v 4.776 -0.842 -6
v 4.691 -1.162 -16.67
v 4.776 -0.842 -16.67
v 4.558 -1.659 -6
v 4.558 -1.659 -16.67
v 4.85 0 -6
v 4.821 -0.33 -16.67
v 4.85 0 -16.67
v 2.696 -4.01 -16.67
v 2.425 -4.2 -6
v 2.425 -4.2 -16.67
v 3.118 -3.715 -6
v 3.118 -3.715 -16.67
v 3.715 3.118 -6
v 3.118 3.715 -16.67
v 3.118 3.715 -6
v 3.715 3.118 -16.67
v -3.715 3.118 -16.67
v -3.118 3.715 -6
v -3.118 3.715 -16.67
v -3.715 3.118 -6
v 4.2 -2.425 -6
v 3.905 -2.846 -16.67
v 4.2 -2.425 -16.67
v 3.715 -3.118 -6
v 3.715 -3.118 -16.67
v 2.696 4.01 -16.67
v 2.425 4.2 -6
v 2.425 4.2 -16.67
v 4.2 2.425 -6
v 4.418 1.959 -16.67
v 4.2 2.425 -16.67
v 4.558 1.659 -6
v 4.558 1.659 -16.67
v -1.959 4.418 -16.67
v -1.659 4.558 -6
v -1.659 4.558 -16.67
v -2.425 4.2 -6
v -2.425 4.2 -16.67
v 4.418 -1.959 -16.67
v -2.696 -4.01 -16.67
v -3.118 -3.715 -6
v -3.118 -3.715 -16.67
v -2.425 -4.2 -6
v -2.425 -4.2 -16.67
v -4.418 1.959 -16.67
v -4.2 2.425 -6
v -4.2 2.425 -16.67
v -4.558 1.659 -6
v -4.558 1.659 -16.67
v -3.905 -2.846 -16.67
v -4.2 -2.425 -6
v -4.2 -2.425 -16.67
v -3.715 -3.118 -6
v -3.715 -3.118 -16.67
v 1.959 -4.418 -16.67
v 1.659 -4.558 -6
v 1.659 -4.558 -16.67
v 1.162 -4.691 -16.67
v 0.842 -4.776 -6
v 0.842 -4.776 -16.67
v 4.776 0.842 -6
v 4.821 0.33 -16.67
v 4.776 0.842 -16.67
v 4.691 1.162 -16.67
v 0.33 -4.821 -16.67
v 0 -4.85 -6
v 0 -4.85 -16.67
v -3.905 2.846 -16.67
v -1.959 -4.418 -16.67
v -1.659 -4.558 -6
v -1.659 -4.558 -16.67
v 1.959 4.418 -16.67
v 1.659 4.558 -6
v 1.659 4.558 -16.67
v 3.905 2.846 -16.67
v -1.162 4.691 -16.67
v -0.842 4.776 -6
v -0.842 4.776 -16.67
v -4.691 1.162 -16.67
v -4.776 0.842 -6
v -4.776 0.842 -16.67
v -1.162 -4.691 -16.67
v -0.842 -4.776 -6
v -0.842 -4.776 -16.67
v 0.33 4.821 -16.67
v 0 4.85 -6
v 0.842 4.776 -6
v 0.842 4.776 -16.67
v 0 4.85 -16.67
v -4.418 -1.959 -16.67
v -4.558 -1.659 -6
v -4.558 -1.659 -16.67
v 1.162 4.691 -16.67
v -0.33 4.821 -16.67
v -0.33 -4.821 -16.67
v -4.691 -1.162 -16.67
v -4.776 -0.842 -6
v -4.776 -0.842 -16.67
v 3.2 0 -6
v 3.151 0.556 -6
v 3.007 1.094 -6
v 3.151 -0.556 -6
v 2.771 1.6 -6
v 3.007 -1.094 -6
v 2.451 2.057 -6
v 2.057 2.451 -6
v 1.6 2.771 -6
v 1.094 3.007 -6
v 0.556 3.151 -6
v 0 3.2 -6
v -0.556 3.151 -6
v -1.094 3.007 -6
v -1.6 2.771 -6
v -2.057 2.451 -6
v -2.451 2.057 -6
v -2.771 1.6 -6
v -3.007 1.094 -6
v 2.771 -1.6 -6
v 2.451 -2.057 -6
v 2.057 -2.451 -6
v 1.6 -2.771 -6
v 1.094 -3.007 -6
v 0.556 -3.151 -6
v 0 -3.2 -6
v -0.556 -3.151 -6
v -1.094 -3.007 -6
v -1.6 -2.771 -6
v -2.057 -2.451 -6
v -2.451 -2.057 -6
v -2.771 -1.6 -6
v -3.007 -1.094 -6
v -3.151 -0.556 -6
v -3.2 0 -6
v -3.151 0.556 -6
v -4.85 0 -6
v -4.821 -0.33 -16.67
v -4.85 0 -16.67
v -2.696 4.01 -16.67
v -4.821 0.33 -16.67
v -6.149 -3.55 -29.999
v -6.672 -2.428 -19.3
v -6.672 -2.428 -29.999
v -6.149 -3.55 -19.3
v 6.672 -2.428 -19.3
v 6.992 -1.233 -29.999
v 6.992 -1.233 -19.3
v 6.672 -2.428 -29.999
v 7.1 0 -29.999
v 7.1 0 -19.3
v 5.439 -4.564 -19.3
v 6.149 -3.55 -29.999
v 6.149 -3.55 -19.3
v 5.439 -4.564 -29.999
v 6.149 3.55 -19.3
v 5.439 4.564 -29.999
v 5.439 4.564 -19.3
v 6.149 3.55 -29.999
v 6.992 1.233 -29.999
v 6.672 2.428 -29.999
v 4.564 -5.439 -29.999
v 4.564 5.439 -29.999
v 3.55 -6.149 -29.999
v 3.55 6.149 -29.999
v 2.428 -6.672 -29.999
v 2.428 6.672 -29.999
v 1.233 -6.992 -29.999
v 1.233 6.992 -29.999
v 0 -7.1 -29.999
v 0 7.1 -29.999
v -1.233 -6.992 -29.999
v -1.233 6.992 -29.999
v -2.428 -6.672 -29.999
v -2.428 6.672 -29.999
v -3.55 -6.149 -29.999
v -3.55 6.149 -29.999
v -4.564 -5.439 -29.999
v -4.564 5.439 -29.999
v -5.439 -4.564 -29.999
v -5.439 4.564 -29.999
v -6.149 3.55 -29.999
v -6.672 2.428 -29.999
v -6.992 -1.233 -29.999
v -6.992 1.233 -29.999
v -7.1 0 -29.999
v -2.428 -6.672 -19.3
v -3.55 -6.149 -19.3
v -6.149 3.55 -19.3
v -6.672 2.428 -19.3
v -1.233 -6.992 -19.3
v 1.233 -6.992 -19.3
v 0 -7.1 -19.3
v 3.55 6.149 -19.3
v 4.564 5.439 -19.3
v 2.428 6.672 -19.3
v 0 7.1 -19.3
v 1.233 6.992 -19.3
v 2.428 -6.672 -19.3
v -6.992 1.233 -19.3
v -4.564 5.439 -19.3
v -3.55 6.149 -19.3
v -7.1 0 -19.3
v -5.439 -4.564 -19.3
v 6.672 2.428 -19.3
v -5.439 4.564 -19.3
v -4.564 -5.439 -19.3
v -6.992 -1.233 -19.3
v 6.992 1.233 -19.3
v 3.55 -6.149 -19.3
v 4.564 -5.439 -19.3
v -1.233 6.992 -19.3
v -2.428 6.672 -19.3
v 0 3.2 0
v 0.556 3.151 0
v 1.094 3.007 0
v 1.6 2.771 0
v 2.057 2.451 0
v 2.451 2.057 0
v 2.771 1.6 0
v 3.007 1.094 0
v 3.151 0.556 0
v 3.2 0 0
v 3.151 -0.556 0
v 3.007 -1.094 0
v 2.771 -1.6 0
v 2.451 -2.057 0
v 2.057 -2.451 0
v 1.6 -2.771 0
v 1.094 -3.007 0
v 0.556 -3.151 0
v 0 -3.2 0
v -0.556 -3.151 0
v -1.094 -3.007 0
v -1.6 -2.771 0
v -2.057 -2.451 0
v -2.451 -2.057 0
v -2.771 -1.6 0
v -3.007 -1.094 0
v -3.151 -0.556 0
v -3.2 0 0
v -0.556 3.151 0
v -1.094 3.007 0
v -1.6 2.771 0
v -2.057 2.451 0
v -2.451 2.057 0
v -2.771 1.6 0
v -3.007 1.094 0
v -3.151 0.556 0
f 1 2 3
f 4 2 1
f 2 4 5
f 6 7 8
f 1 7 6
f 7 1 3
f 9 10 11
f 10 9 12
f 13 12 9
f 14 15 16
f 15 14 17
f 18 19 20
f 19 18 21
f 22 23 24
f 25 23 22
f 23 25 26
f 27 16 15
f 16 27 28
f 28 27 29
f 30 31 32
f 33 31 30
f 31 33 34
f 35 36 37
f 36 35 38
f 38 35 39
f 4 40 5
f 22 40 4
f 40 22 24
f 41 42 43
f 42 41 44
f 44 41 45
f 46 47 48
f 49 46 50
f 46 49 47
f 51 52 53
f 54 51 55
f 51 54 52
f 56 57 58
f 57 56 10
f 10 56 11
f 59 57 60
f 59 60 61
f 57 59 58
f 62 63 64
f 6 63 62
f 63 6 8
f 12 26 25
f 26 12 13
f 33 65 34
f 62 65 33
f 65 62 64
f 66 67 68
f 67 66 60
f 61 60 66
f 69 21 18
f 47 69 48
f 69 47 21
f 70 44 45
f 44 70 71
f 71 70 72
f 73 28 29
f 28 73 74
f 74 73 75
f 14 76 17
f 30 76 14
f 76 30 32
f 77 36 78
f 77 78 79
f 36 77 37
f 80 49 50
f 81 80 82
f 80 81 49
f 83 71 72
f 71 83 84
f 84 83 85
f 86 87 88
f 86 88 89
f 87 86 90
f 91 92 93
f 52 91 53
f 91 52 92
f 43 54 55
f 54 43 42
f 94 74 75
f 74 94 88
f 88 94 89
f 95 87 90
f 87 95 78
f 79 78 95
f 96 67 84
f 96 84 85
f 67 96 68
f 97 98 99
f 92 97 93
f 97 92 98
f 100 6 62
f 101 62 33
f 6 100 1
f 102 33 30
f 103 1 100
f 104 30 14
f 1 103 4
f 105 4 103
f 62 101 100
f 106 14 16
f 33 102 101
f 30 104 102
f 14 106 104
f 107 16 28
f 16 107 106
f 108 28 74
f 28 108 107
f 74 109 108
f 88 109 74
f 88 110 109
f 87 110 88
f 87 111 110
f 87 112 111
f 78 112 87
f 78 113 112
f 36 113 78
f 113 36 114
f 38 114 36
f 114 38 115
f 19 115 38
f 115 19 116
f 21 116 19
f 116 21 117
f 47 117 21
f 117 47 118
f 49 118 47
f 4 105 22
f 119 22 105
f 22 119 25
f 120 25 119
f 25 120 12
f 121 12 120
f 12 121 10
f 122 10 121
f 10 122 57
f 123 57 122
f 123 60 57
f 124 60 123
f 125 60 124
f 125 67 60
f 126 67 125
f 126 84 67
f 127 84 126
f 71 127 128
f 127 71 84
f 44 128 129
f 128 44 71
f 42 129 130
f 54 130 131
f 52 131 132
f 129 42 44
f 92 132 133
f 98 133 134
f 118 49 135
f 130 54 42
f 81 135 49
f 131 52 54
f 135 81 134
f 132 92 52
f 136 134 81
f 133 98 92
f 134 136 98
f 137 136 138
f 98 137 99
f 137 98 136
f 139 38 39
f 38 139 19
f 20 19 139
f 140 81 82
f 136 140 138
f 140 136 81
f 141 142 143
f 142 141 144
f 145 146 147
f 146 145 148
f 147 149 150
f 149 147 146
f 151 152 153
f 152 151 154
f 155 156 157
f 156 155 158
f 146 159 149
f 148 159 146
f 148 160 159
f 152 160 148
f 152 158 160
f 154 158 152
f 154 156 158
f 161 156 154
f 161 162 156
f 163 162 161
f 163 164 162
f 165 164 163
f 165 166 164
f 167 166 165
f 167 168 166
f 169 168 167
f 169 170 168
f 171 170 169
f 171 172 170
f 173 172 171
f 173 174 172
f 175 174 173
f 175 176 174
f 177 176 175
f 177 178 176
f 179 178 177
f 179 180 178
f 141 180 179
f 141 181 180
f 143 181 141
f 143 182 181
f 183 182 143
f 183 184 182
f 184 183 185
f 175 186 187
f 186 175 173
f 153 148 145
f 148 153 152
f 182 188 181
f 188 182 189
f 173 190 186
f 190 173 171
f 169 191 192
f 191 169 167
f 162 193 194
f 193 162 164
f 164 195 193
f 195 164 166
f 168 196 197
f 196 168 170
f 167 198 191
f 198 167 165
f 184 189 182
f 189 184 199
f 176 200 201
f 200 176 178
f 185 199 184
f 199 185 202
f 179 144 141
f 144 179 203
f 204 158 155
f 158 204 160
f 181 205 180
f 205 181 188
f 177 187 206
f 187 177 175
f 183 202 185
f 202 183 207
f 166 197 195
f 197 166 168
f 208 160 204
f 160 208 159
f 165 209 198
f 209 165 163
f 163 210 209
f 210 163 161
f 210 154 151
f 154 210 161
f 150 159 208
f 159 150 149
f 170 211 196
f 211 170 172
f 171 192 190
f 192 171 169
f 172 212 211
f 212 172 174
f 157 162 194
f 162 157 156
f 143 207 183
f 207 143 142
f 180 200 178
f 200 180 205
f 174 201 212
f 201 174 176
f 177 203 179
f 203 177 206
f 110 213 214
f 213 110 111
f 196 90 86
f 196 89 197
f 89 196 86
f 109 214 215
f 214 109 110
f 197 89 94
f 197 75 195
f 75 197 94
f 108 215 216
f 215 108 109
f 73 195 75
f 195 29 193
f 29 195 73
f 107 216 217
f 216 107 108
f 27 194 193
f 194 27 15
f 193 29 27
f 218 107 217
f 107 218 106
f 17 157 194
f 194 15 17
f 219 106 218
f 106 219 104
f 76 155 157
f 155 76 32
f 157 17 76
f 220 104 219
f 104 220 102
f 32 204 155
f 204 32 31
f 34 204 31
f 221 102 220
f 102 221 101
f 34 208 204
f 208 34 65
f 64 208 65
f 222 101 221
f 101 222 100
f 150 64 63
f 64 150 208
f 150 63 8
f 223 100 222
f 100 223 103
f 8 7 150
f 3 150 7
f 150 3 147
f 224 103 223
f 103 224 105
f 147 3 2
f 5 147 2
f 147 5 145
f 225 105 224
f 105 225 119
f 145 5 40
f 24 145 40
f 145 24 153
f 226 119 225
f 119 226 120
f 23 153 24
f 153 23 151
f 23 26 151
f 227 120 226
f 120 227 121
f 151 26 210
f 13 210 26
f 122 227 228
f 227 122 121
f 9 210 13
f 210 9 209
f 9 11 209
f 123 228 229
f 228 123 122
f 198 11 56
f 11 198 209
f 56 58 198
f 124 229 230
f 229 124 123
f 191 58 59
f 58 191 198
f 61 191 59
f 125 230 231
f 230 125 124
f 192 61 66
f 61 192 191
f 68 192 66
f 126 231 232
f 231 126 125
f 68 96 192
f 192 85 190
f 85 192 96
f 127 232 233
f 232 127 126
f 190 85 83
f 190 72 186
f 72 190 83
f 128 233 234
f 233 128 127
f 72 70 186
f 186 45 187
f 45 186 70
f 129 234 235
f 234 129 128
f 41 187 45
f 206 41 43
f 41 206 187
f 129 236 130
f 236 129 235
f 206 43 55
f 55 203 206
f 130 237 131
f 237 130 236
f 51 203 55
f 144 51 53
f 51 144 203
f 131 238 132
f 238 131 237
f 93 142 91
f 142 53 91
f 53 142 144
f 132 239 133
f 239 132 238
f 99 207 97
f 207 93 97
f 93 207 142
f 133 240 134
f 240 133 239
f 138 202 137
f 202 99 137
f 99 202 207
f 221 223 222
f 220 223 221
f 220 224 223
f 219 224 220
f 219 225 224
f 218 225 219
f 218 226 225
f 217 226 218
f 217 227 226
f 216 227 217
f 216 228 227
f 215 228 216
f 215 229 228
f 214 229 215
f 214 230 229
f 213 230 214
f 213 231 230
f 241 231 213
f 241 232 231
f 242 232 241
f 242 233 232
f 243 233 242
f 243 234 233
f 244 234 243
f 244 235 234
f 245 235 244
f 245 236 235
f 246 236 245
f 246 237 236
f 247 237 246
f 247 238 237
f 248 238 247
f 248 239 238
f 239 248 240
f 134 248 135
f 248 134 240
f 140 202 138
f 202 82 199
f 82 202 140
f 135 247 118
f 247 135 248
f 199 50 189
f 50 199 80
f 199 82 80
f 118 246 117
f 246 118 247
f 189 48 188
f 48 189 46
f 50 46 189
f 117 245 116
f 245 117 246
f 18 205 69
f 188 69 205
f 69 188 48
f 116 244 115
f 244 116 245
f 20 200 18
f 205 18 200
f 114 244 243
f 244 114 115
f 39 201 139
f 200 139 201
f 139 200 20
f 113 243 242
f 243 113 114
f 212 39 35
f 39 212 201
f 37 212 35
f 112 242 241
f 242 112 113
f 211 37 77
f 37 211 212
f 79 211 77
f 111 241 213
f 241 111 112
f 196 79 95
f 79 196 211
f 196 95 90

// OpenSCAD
// Start: lazy_union
default_5_default_5();
// End: lazy_union

// Modules.

// 'PartMaterial undef-default - default 5.0'
module default_5_default_5() {
  // 'None : _combine_solids_and_holes'
  union() {
    // 'default : _combine_solids_and_holes'
    union() {
      // 'screw_cage'
      %multmatrix(m=[[1.0, 0.0, 0.0, 0.0], [-0.0, -1.0, -0.0, -0.0], [-0.0, -0.0, -1.0, -0.0], [0.0, 0.0, 0.0, 1.0]]) {
        // 'screw_cage'
        color(c=[0.0, 1.0, 0.35, 0.4]) {
          // 'screw_cage : _combine_solids_and_holes'
          union() {
            // 'screw_cage'
            cylinder(h=20.0, r1=3.35, r2=3.35, center=false, $fn=36);
          }
        }
      }
      // 'thru_shaft'
      multmatrix(m=[[1.0, 0.0, 0.0, 0.0], [0.0, -1.0, 0.0, 0.0], [0.0, 0.0, -1.0, -6.0], [0.0, 0.0, 0.0, 1.0]]) {
        // 'thru_shaft : _combine_solids_and_holes'
        union() {
          // 'thru_shaft'
          cylinder(h=14.0, r1=4.85, r2=4.85, center=false, $fn=36);
        }
      }
      // 'access_hole'
      multmatrix(m=[[1.0, 0.0, 0.0, 0.0], [0.0, -1.0, 0.0, 0.0], [0.0, 0.0, -1.0, -19.999], [0.0, 0.0, 0.0, 1.0]]) {
        // 'access_hole : _combine_solids_and_holes'
        union() {
          // 'access_hole'
          cylinder(h=10.0, r1=7.1, r2=7.1, center=false, $fn=36);
        }
      }
      // 'screw_hole'
      multmatrix(m=[[0.0, -1.0, 0.0, 0.0], [-1.0, 0.0, 0.0, 0.0], [0.0, 0.0, -1.0, 0.0], [0.0, 0.0, 0.0, 1.0]]) {
        // 'screw_hole : _combine_solids_and_holes'
        union() {
          // 'screw_hole'
          polyhedron(points=[[0.0, 0.0, 0.0], [-3.2, 0.0, 0.0], [-3.2, 0.0, 6.0], [-3.35, 0.0, 6.0], [-3.35, 0.0, 14.8], [-3.25, 0.0, 14.8], [-7.1, 0.0, 19.3], [-7.1, 0.0, 20.0], [0.0, 0.0, 20.0], [0.0, 0.0, 0.0], [-3.1513848096390658, -0.5556741685341771, 0.0], [-3.1513848096390658, -0.5556741685341771, 6.0], [-3.299105972590897, -0.5817213951842166, 6.0], [-3.299105972590897, -0.5817213951842166, 14.8], [-3.200625197289676, -0.5643565774175235, 14.8], [-6.992135046386677, -1.2329020614352053, 19.3], [-6.992135046386677, -1.2329020614352053, 20.0], [0.0, 0.0, 20.0], [0.0, 0.0, 0.0], [-3.0070163865149073, -1.09446445864214, 0.0], [-3.0070163865149073, -1.09446445864214, 6.0], [-3.1479702796327933, -1.1457674801409903, 6.0], [-3.1479702796327933, -1.1457674801409903, 14.8], [-3.0540010175542025, -1.1115654658084233, 14.8], [-6.67181760757995, -2.4283430176122476, 19.3], [-6.67181760757995, -2.4283430176122476, 20.0], [0.0, 0.0, 20.0], [0.0, 0.0, 0.0], [-2.771281292110204, -1.5999999999999999, 0.0], [-2.771281292110204, -1.5999999999999999, 6.0], [-2.9011851026778697, -1.6749999999999998, 6.0], [-2.9011851026778697, -1.6749999999999998, 14.8], [-2.814582562299426, -1.6249999999999998, 14.8], [-6.148780366869515, -3.5499999999999994, 19.3], [-6.148780366869515, -3.5499999999999994, 20.0], [0.0, 0.0, 20.0], [0.0, 0.0, 0.0], [-2.45134221798073, -2.0569203509969256, 0.0], [-2.45134221798073, -2.0569203509969256, 6.0], [-2.5662488844485765, -2.1533384924499064, 6.0], [-2.5662488844485765, -2.1533384924499064, 14.8], [-2.4896444401366784, -2.0890597314812527, 14.8], [-5.438915546144743, -4.5637920287744285, 19.3], [-5.438915546144743, -4.5637920287744285, 20.0], [0.0, 0.0, 20.0], [0.0, 0.0, 0.0], [-2.056920350996926, -2.45134221798073, 0.0], [-2.056920350996926, -2.45134221798073, 6.0], [-2.153338492449907, -2.5662488844485765, 6.0], [-2.153338492449907, -2.5662488844485765, 14.8], [-2.089059731481253, -2.4896444401366784, 14.8], [-4.563792028774429, -5.438915546144743, 19.3], [-4.563792028774429, -5.438915546144743, 20.0], [0.0, 0.0, 20.0], [0.0, 0.0, 0.0], [-1.6000000000000005, -2.7712812921102037, 0.0], [-1.6000000000000005, -2.7712812921102037, 6.0], [-1.6750000000000005, -2.901185102677869, 6.0], [-1.6750000000000005, -2.901185102677869, 14.8], [-1.6250000000000004, -2.8145825622994254, 14.8], [-3.5500000000000007, -6.148780366869514, 19.3], [-3.5500000000000007, -6.148780366869514, 20.0], [0.0, 0.0, 20.0], [0.0, 0.0, 0.0], [-1.0944644586421404, -3.007016386514907, 0.0], [-1.0944644586421404, -3.007016386514907, 6.0], [-1.1457674801409905, -3.147970279632793, 6.0], [-1.1457674801409905, -3.147970279632793, 14.8], [-1.1115654658084237, -3.054001017554202, 14.8], [-2.4283430176122485, -6.671817607579949, 19.3], [-2.4283430176122485, -6.671817607579949, 20.0], [0.0, 0.0, 20.0], [0.0, 0.0, 0.0], [-0.5556741685341774, -3.1513848096390658, 0.0], [-0.5556741685341774, -3.1513848096390658, 6.0], [-0.581721395184217, -3.299105972590897, 6.0], [-0.581721395184217, -3.299105972590897, 14.8], [-0.5643565774175239, -3.200625197289676, 14.8], [-1.232902061435206, -6.992135046386677, 19.3], [-1.232902061435206, -6.992135046386677, 20.0], [0.0, 0.0, 20.0], [0.0, 0.0, 0.0], [0.0, -3.2, 0.0], [0.0, -3.2, 6.0], [0.0, -3.35, 6.0], [0.0, -3.35, 14.8], [0.0, -3.25, 14.8], [0.0, -7.1, 19.3], [0.0, -7.1, 20.0], [0.0, 0.0, 20.0], [0.0, 0.0, 0.0], [0.555674168534177, -3.1513848096390658, 0.0], [0.555674168534177, -3.1513848096390658, 6.0], [0.5817213951842165, -3.299105972590897, 6.0], [0.5817213951842165, -3.299105972590897, 14.8], [0.5643565774175234, -3.200625197289676, 14.8], [1.232902061435205, -6.992135046386677, 19.3], [1.232902061435205, -6.992135046386677, 20.0], [0.0, 0.0, 20.0], [0.0, 0.0, 0.0], [1.09446445864214, -3.0070163865149073, 0.0], [1.09446445864214, -3.0070163865149073, 6.0], [1.1457674801409903, -3.1479702796327933, 6.0], [1.1457674801409903, -3.1479702796327933, 14.8], [1.1115654658084233, -3.0540010175542025, 14.8], [2.4283430176122476, -6.67181760757995, 19.3], [2.4283430176122476, -6.67181760757995, 20.0], [0.0, 0.0, 20.0], [0.0, 0.0, 0.0], [1.5999999999999994, -2.771281292110204, 0.0], [1.5999999999999994, -2.771281292110204, 6.0], [1.6749999999999994, -2.9011851026778697, 6.0], [1.6749999999999994, -2.9011851026778697, 14.8], [1.6249999999999993, -2.814582562299426, 14.8], [3.549999999999998, -6.148780366869515, 19.3], [3.549999999999998, -6.148780366869515, 20.0], [0.0, 0.0, 20.0], [0.0, 0.0, 0.0], [2.056920350996926, -2.45134221798073, 0.0], [2.056920350996926, -2.45134221798073, 6.0], [2.153338492449907, -2.5662488844485765, 6.0], [2.153338492449907, -2.5662488844485765, 14.8], [2.089059731481253, -2.4896444401366784, 14.8], [4.563792028774429, -5.438915546144743, 19.3], [4.563792028774429, -5.438915546144743, 20.0], [0.0, 0.0, 20.0], [0.0, 0.0, 0.0], [2.4513422179807294, -2.0569203509969265, 0.0], [2.4513422179807294, -2.0569203509969265, 6.0], [2.566248884448576, -2.1533384924499073, 6.0], [2.566248884448576, -2.1533384924499073, 14.8], [2.4896444401366784, -2.089059731481253, 14.8], [5.4389155461447425, -4.56379202877443, 19.3], [5.4389155461447425, -4.56379202877443, 20.0], [0.0, 0.0, 20.0], [0.0, 0.0, 0.0], [2.771281292110204, -1.5999999999999999, 0.0], [2.771281292110204, -1.5999999999999999, 6.0], [2.9011851026778697, -1.6749999999999998, 6.0], [2.9011851026778697, -1.6749999999999998, 14.8], [2.814582562299426, -1.6249999999999998, 14.8], [6.148780366869515, -3.5499999999999994, 19.3], [6.148780366869515, -3.5499999999999994, 20.0], [0.0, 0.0, 20.0], [0.0, 0.0, 0.0], [3.007016386514907, -1.0944644586421404, 0.0], [3.007016386514907, -1.0944644586421404, 6.0], [3.147970279632793, -1.1457674801409907, 6.0], [3.147970279632793, -1.1457674801409907, 14.8], [3.054001017554202, -1.111565465808424, 14.8], [6.671817607579949, -2.428343017612249, 19.3], [6.671817607579949, -2.428343017612249, 20.0], [0.0, 0.0, 20.0], [0.0, 0.0, 0.0], [3.1513848096390658, -0.5556741685341783, 0.0], [3.1513848096390658, -0.5556741685341783, 6.0], [3.299105972590897, -0.5817213951842178, 6.0], [3.299105972590897, -0.5817213951842178, 14.8], [3.200625197289676, -0.5643565774175248, 14.8], [6.992135046386677, -1.2329020614352078, 19.3], [6.992135046386677, -1.2329020614352078, 20.0], [0.0, 0.0, 20.0], [0.0, 0.0, 0.0], [3.2, 0.0, 0.0], [3.2, 0.0, 6.0], [3.35, 0.0, 6.0], [3.35, 0.0, 14.8], [3.25, 0.0, 14.8], [7.1, 0.0, 19.3], [7.1, 0.0, 20.0], [0.0, 0.0, 20.0], [0.0, 0.0, 0.0], [3.151384809639066, 0.5556741685341761, 0.0], [3.151384809639066, 0.5556741685341761, 6.0], [3.299105972590897, 0.5817213951842156, 6.0], [3.299105972590897, 0.5817213951842156, 14.8], [3.2006251972896766, 0.5643565774175225, 14.8], [6.992135046386678, 1.232902061435203, 19.3], [6.992135046386678, 1.232902061435203, 20.0], [0.0, 0.0, 20.0], [0.0, 0.0, 0.0], [3.0070163865149073, 1.0944644586421397, 0.0], [3.0070163865149073, 1.0944644586421397, 6.0], [3.1479702796327933, 1.14576748014099, 6.0], [3.1479702796327933, 1.14576748014099, 14.8], [3.0540010175542025, 1.111565465808423, 14.8], [6.67181760757995, 2.428343017612247, 19.3], [6.67181760757995, 2.428343017612247, 20.0], [0.0, 0.0, 20.0], [0.0, 0.0, 0.0], [2.7712812921102046, 1.5999999999999992, 0.0], [2.7712812921102046, 1.5999999999999992, 6.0], [2.90118510267787, 1.6749999999999992, 6.0], [2.90118510267787, 1.6749999999999992, 14.8], [2.8145825622994263, 1.6249999999999991, 14.8], [6.148780366869516, 3.549999999999998, 19.3], [6.148780366869516, 3.549999999999998, 20.0], [0.0, 0.0, 20.0], [0.0, 0.0, 0.0], [2.45134221798073, 2.0569203509969256, 0.0], [2.45134221798073, 2.0569203509969256, 6.0], [2.5662488844485765, 2.1533384924499064, 6.0], [2.5662488844485765, 2.1533384924499064, 14.8], [2.4896444401366784, 2.0890597314812527, 14.8], [5.438915546144743, 4.5637920287744285, 19.3], [5.438915546144743, 4.5637920287744285, 20.0], [0.0, 0.0, 20.0], [0.0, 0.0, 0.0], [2.0569203509969265, 2.4513422179807294, 0.0], [2.0569203509969265, 2.4513422179807294, 6.0], [2.1533384924499073, 2.566248884448576, 6.0], [2.1533384924499073, 2.566248884448576, 14.8], [2.089059731481253, 2.4896444401366784, 14.8], [4.56379202877443, 5.4389155461447425, 19.3], [4.56379202877443, 5.4389155461447425, 20.0], [0.0, 0.0, 20.0], [0.0, 0.0, 0.0], [1.6000000000000014, 2.7712812921102032, 0.0], [1.6000000000000014, 2.7712812921102032, 6.0], [1.6750000000000016, 2.901185102677869, 6.0], [1.6750000000000016, 2.901185102677869, 14.8], [1.6250000000000013, 2.814582562299425, 14.8], [3.550000000000003, 6.148780366869513, 19.3], [3.550000000000003, 6.148780366869513, 20.0], [0.0, 0.0, 20.0], [0.0, 0.0, 0.0], [1.0944644586421421, 3.0070163865149064, 0.0], [1.0944644586421421, 3.0070163865149064, 6.0], [1.1457674801409925, 3.1479702796327924, 6.0], [1.1457674801409925, 3.1479702796327924, 14.8], [1.1115654658084255, 3.0540010175542016, 14.8], [2.4283430176122525, 6.671817607579948, 19.3], [2.4283430176122525, 6.671817607579948, 20.0], [0.0, 0.0, 20.0], [0.0, 0.0, 0.0], [0.5556741685341771, 3.1513848096390658, 0.0], [0.5556741685341771, 3.1513848096390658, 6.0], [0.5817213951842166, 3.299105972590897, 6.0], [0.5817213951842166, 3.299105972590897, 14.8], [0.5643565774175235, 3.200625197289676, 14.8], [1.2329020614352053, 6.992135046386677, 19.3], [1.2329020614352053, 6.992135046386677, 20.0], [0.0, 0.0, 20.0], [0.0, 0.0, 0.0], [0.0, 3.2, 0.0], [0.0, 3.2, 6.0], [0.0, 3.35, 6.0], [0.0, 3.35, 14.8], [0.0, 3.25, 14.8], [0.0, 7.1, 19.3], [0.0, 7.1, 20.0], [0.0, 0.0, 20.0], [0.0, 0.0, 0.0], [-0.555674168534176, 3.151384809639066, 0.0], [-0.555674168534176, 3.151384809639066, 6.0], [-0.5817213951842154, 3.299105972590897, 6.0], [-0.5817213951842154, 3.299105972590897, 14.8], [-0.5643565774175224, 3.2006251972896766, 14.8], [-1.2329020614352026, 6.992135046386678, 19.3], [-1.2329020614352026, 6.992135046386678, 20.0], [0.0, 0.0, 20.0], [0.0, 0.0, 0.0], [-1.0944644586421381, 3.0070163865149073, 0.0], [-1.0944644586421381, 3.0070163865149073, 6.0], [-1.1457674801409883, 3.1479702796327937, 6.0], [-1.1457674801409883, 3.1479702796327937, 14.8], [-1.1115654658084215, 3.054001017554203, 14.8], [-2.4283430176122436, 6.671817607579951, 19.3], [-2.4283430176122436, 6.671817607579951, 20.0], [0.0, 0.0, 20.0], [0.0, 0.0, 0.0], [-1.6000000000000005, 2.7712812921102037, 0.0], [-1.6000000000000005, 2.7712812921102037, 6.0], [-1.6750000000000005, 2.901185102677869, 6.0], [-1.6750000000000005, 2.901185102677869, 14.8], [-1.6250000000000004, 2.8145825622994254, 14.8], [-3.5500000000000007, 6.148780366869514, 19.3], [-3.5500000000000007, 6.148780366869514, 20.0], [0.0, 0.0, 20.0], [0.0, 0.0, 0.0], [-2.0569203509969256, 2.4513422179807303, 0.0], [-2.0569203509969256, 2.4513422179807303, 6.0], [-2.1533384924499064, 2.566248884448577, 6.0], [-2.1533384924499064, 2.566248884448577, 14.8], [-2.0890597314812527, 2.489644440136679, 14.8], [-4.5637920287744285, 5.438915546144744, 19.3], [-4.5637920287744285, 5.438915546144744, 20.0], [0.0, 0.0, 20.0], [0.0, 0.0, 0.0], [-2.451342217980729, 2.056920350996927, 0.0], [-2.451342217980729, 2.056920350996927, 6.0], [-2.5662488844485756, 2.1533384924499077, 6.0], [-2.5662488844485756, 2.1533384924499077, 14.8], [-2.489644440136678, 2.0890597314812536, 14.8], [-5.4389155461447425, 4.563792028774431, 19.3], [-5.4389155461447425, 4.563792028774431, 20.0], [0.0, 0.0, 20.0], [0.0, 0.0, 0.0], [-2.771281292110203, 1.6000000000000014, 0.0], [-2.771281292110203, 1.6000000000000014, 6.0], [-2.9011851026778688, 1.6750000000000016, 6.0], [-2.9011851026778688, 1.6750000000000016, 14.8], [-2.8145825622994245, 1.6250000000000013, 14.8], [-6.148780366869512, 3.550000000000003, 19.3], [-6.148780366869512, 3.550000000000003, 20.0], [0.0, 0.0, 20.0], [0.0, 0.0, 0.0], [-3.007016386514906, 1.0944644586421421, 0.0], [-3.007016386514906, 1.0944644586421421, 6.0], [-3.1479702796327924, 1.1457674801409927, 6.0], [-3.1479702796327924, 1.1457674801409927, 14.8], [-3.054001017554201, 1.1115654658084257, 14.8], [-6.671817607579947, 2.428343017612253, 19.3], [-6.671817607579947, 2.428343017612253, 20.0], [0.0, 0.0, 20.0], [0.0, 0.0, 0.0], [-3.1513848096390658, 0.5556741685341773, 0.0], [-3.1513848096390658, 0.5556741685341773, 6.0], [-3.299105972590897, 0.5817213951842168, 6.0], [-3.299105972590897, 0.5817213951842168, 14.8], [-3.200625197289676, 0.5643565774175238, 14.8], [-6.992135046386677, 1.2329020614352058, 19.3], [-6.992135046386677, 1.2329020614352058, 20.0], [0.0, 0.0, 20.0], [0.0, 0.0, 0.0], [-3.2, 0.0, 0.0], [-3.2, 0.0, 6.0], [-3.35, 0.0, 6.0], [-3.35, 0.0, 14.8], [-3.25, 0.0, 14.8], [-7.1, 0.0, 19.3], [-7.1, 0.0, 20.0], [0.0, 0.0, 20.0]], faces=[[0, 9, 10, 1], [1, 10, 11, 2], [2, 11, 12, 3], [3, 12, 13, 4], [4, 13, 14, 5], [5, 14, 15, 6], [6, 15, 16, 7], [7, 16, 17, 8], [8, 17, 9, 0], [9, 18, 19, 10], [10, 19, 20, 11], [11, 20, 21, 12], [12, 21, 22, 13], [13, 22, 23, 14], [14, 23, 24, 15], [15, 24, 25, 16], [16, 25, 26, 17], [17, 26, 18, 9], [18, 27, 28, 19], [19, 28, 29, 20], [20, 29, 30, 21], [21, 30, 31, 22], [22, 31, 32, 23], [23, 32, 33, 24], [24, 33, 34, 25], [25, 34, 35, 26], [26, 35, 27, 18], [27, 36, 37, 28], [28, 37, 38, 29], [29, 38, 39, 30], [30, 39, 40, 31], [31, 40, 41, 32], [32, 41, 42, 33], [33, 42, 43, 34], [34, 43, 44, 35], [35, 44, 36, 27], [36, 45, 46, 37], [37, 46, 47, 38], [38, 47, 48, 39], [39, 48, 49, 40], [40, 49, 50, 41], [41, 50, 51, 42], [42, 51, 52, 43], [43, 52, 53, 44], [44, 53, 45, 36], [45, 54, 55, 46], [46, 55, 56, 47], [47, 56, 57, 48], [48, 57, 58, 49], [49, 58, 59, 50], [50, 59, 60, 51], [51, 60, 61, 52], [52, 61, 62, 53], [53, 62, 54, 45], [54, 63, 64, 55], [55, 64, 65, 56], [56, 65, 66, 57], [57, 66, 67, 58], [58, 67, 68, 59], [59, 68, 69, 60], [60, 69, 70, 61], [61, 70, 71, 62], [62, 71, 63, 54], [63, 72, 73, 64], [64, 73, 74, 65], [65, 74, 75, 66], [66, 75, 76, 67], [67, 76, 77, 68], [68, 77, 78, 69], [69, 78, 79, 70], [70, 79, 80, 71], [71, 80, 72, 63], [72, 81, 82, 73], [73, 82, 83, 74], [74, 83, 84, 75], [75, 84, 85, 76], [76, 85, 86, 77], [77, 86, 87, 78], [78, 87, 88, 79], [79, 88, 89, 80], [80, 89, 81, 72], [81, 90, 91, 82], [82, 91, 92, 83], [83, 92, 93, 84], [84, 93, 94, 85], [85, 94, 95, 86], [86, 95, 96, 87], [87, 96, 97, 88], [88, 97, 98, 89], [89, 98, 90, 81], [90, 99, 100, 91], [91, 100, 101, 92], [92, 101, 102, 93], [93, 102, 103, 94], [94, 103, 104, 95], [95, 104, 105, 96], [96, 105, 106, 97], [97, 106, 107, 98], [98, 107, 99, 90], [99, 108, 109, 100], [100, 109, 110, 101], [101, 110, 111, 102], [102, 111, 112, 103], [103, 112, 113, 104], [104, 113, 114, 105], [105, 114, 115, 106], [106, 115, 116, 107], [107, 116, 108, 99], [108, 117, 118, 109], [109, 118, 119, 110], [110, 119, 120, 111], [111, 120, 121, 112], [112, 121, 122, 113], [113, 122, 123, 114], [114, 123, 124, 115], [115, 124, 125, 116], [116, 125, 117, 108], [117, 126, 127, 118], [118, 127, 128, 119], [119, 128, 129, 120], [120, 129, 130, 121], [121, 130, 131, 122], [122, 131, 132, 123], [123, 132, 133, 124], [124, 133, 134, 125], [125, 134, 126, 117], [126, 135, 136, 127], [127, 136, 137, 128], [128, 137, 138, 129], [129, 138, 139, 130], [130, 139, 140, 131], [131, 140, 141, 132], [132, 141, 142, 133], [133, 142, 143, 134], [134, 143, 135, 126], [135, 144, 145, 136], [136, 145, 146, 137], [137, 146, 147, 138], [138, 147, 148, 139], [139, 148, 149, 140], [140, 149, 150, 141], [141, 150, 151, 142], [142, 151, 152, 143], [143, 152, 144, 135], [144, 153, 154, 145], [145, 154, 155, 146], [146, 155, 156, 147], [147, 156, 157, 148], [148, 157, 158, 149], [149, 158, 159, 150], [150, 159, 160, 151], [151, 160, 161, 152], [152, 161, 153, 144], [153, 162, 163, 154], [154, 163, 164, 155], [155, 164, 165, 156], [156, 165, 166, 157], [157, 166, 167, 158], [158, 167, 168, 159], [159, 168, 169, 160], [160, 169, 170, 161], [161, 170, 162, 153], [162, 171, 172, 163], [163, 172, 173, 164], [164, 173, 174, 165], [165, 174, 175, 166], [166, 175, 176, 167], [167, 176, 177, 168], [168, 177, 178, 169], [169, 178, 179, 170], [170, 179, 171, 162], [171, 180, 181, 172], [172, 181, 182, 173], [173, 182, 183, 174], [174, 183, 184, 175], [175, 184, 185, 176], [176, 185, 186, 177], [177, 186, 187, 178], [178, 187, 188, 179], [179, 188, 180, 171], [180, 189, 190, 181], [181, 190, 191, 182], [182, 191, 192, 183], [183, 192, 193, 184], [184, 193, 194, 185], [185, 194, 195, 186], [186, 195, 196, 187], [187, 196, 197, 188], [188, 197, 189, 180], [189, 198, 199, 190], [190, 199, 200, 191], [191, 200, 201, 192], [192, 201, 202, 193], [193, 202, 203, 194], [194, 203, 204, 195], [195, 204, 205, 196], [196, 205, 206, 197], [197, 206, 198, 189], [198, 207, 208, 199], [199, 208, 209, 200], [200, 209, 210, 201], [201, 210, 211, 202], [202, 211, 212, 203], [203, 212, 213, 204], [204, 213, 214, 205], [205, 214, 215, 206], [206, 215, 207, 198], [207, 216, 217, 208], [208, 217, 218, 209], [209, 218, 219, 210], [210, 219, 220, 211], [211, 220, 221, 212], [212, 221, 222, 213], [213, 222, 223, 214], [214, 223, 224, 215], [215, 224, 216, 207], [216, 225, 226, 217], [217, 226, 227, 218], [218, 227, 228, 219], [219, 228, 229, 220], [220, 229, 230, 221], [221, 230, 231, 222], [222, 231, 232, 223], [223, 232, 233, 224], [224, 233, 225, 216], [225, 234, 235, 226], [226, 235, 236, 227], [227, 236, 237, 228], [228, 237, 238, 229], [229, 238, 239, 230], [230, 239, 240, 231], [231, 240, 241, 232], [232, 241, 242, 233], [233, 242, 234, 225], [234, 243, 244, 235], [235, 244, 245, 236], [236, 245, 246, 237], [237, 246, 247, 238], [238, 247, 248, 239], [239, 248, 249, 240], [240, 249, 250, 241], [241, 250, 251, 242], [242, 251, 243, 234], [243, 252, 253, 244], [244, 253, 254, 245], [245, 254, 255, 246], [246, 255, 256, 247], [247, 256, 257, 248], [248, 257, 258, 249], [249, 258, 259, 250], [250, 259, 260, 251], [251, 260, 252, 243], [252, 261, 262, 253], [253, 262, 263, 254], [254, 263, 264, 255], [255, 264, 265, 256], [256, 265, 266, 257], [257, 266, 267, 258], [258, 267, 268, 259], [259, 268, 269, 260], [260, 269, 261, 252], [261, 270, 271, 262], [262, 271, 272, 263], [263, 272, 273, 264], [264, 273, 274, 265], [265, 274, 275, 266], [266, 275, 276, 267], [267, 276, 277, 268], [268, 277, 278, 269], [269, 278, 270, 261], [270, 279, 280, 271], [271, 280, 281, 272], [272, 281, 282, 273], [273, 282, 283, 274], [274, 283, 284, 275], [275, 284, 285, 276], [276, 285, 286, 277], [277, 286, 287, 278], [278, 287, 279, 270], [279, 288, 289, 280], [280, 289, 290, 281], [281, 290, 291, 282], [282, 291, 292, 283], [283, 292, 293, 284], [284, 293, 294, 285], [285, 294, 295, 286], [286, 295, 296, 287], [287, 296, 288, 279], [288, 297, 298, 289], [289, 298, 299, 290], [290, 299, 300, 291], [291, 300, 301, 292], [292, 301, 302, 293], [293, 302, 303, 294], [294, 303, 304, 295], [295, 304, 305, 296], [296, 305, 297, 288], [297, 306, 307, 298], [298, 307, 308, 299], [299, 308, 309, 300], [300, 309, 310, 301], [301, 310, 311, 302], [302, 311, 312, 303], [303, 312, 313, 304], [304, 313, 314, 305], [305, 314, 306, 297], [306, 315, 316, 307], [307, 316, 317, 308], [308, 317, 318, 309], [309, 318, 319, 310], [310, 319, 320, 311], [311, 320, 321, 312], [312, 321, 322, 313], [313, 322, 323, 314], [314, 323, 315, 306], [315, 324, 325, 316], [316, 325, 326, 317], [317, 326, 327, 318], [318, 327, 328, 319], [319, 328, 329, 320], [320, 329, 330, 321], [321, 330, 331, 322], [322, 331, 332, 323], [323, 332, 324, 315], [324, 0, 1, 325], [325, 1, 2, 326], [326, 2, 3, 327], [327, 3, 4, 328], [328, 4, 5, 329], [329, 5, 6, 330], [330, 6, 7, 331], [331, 7, 8, 332], [332, 8, 0, 324]], convexity=10);
        }
      }
    }
  }
} // end module default_5_default_5
